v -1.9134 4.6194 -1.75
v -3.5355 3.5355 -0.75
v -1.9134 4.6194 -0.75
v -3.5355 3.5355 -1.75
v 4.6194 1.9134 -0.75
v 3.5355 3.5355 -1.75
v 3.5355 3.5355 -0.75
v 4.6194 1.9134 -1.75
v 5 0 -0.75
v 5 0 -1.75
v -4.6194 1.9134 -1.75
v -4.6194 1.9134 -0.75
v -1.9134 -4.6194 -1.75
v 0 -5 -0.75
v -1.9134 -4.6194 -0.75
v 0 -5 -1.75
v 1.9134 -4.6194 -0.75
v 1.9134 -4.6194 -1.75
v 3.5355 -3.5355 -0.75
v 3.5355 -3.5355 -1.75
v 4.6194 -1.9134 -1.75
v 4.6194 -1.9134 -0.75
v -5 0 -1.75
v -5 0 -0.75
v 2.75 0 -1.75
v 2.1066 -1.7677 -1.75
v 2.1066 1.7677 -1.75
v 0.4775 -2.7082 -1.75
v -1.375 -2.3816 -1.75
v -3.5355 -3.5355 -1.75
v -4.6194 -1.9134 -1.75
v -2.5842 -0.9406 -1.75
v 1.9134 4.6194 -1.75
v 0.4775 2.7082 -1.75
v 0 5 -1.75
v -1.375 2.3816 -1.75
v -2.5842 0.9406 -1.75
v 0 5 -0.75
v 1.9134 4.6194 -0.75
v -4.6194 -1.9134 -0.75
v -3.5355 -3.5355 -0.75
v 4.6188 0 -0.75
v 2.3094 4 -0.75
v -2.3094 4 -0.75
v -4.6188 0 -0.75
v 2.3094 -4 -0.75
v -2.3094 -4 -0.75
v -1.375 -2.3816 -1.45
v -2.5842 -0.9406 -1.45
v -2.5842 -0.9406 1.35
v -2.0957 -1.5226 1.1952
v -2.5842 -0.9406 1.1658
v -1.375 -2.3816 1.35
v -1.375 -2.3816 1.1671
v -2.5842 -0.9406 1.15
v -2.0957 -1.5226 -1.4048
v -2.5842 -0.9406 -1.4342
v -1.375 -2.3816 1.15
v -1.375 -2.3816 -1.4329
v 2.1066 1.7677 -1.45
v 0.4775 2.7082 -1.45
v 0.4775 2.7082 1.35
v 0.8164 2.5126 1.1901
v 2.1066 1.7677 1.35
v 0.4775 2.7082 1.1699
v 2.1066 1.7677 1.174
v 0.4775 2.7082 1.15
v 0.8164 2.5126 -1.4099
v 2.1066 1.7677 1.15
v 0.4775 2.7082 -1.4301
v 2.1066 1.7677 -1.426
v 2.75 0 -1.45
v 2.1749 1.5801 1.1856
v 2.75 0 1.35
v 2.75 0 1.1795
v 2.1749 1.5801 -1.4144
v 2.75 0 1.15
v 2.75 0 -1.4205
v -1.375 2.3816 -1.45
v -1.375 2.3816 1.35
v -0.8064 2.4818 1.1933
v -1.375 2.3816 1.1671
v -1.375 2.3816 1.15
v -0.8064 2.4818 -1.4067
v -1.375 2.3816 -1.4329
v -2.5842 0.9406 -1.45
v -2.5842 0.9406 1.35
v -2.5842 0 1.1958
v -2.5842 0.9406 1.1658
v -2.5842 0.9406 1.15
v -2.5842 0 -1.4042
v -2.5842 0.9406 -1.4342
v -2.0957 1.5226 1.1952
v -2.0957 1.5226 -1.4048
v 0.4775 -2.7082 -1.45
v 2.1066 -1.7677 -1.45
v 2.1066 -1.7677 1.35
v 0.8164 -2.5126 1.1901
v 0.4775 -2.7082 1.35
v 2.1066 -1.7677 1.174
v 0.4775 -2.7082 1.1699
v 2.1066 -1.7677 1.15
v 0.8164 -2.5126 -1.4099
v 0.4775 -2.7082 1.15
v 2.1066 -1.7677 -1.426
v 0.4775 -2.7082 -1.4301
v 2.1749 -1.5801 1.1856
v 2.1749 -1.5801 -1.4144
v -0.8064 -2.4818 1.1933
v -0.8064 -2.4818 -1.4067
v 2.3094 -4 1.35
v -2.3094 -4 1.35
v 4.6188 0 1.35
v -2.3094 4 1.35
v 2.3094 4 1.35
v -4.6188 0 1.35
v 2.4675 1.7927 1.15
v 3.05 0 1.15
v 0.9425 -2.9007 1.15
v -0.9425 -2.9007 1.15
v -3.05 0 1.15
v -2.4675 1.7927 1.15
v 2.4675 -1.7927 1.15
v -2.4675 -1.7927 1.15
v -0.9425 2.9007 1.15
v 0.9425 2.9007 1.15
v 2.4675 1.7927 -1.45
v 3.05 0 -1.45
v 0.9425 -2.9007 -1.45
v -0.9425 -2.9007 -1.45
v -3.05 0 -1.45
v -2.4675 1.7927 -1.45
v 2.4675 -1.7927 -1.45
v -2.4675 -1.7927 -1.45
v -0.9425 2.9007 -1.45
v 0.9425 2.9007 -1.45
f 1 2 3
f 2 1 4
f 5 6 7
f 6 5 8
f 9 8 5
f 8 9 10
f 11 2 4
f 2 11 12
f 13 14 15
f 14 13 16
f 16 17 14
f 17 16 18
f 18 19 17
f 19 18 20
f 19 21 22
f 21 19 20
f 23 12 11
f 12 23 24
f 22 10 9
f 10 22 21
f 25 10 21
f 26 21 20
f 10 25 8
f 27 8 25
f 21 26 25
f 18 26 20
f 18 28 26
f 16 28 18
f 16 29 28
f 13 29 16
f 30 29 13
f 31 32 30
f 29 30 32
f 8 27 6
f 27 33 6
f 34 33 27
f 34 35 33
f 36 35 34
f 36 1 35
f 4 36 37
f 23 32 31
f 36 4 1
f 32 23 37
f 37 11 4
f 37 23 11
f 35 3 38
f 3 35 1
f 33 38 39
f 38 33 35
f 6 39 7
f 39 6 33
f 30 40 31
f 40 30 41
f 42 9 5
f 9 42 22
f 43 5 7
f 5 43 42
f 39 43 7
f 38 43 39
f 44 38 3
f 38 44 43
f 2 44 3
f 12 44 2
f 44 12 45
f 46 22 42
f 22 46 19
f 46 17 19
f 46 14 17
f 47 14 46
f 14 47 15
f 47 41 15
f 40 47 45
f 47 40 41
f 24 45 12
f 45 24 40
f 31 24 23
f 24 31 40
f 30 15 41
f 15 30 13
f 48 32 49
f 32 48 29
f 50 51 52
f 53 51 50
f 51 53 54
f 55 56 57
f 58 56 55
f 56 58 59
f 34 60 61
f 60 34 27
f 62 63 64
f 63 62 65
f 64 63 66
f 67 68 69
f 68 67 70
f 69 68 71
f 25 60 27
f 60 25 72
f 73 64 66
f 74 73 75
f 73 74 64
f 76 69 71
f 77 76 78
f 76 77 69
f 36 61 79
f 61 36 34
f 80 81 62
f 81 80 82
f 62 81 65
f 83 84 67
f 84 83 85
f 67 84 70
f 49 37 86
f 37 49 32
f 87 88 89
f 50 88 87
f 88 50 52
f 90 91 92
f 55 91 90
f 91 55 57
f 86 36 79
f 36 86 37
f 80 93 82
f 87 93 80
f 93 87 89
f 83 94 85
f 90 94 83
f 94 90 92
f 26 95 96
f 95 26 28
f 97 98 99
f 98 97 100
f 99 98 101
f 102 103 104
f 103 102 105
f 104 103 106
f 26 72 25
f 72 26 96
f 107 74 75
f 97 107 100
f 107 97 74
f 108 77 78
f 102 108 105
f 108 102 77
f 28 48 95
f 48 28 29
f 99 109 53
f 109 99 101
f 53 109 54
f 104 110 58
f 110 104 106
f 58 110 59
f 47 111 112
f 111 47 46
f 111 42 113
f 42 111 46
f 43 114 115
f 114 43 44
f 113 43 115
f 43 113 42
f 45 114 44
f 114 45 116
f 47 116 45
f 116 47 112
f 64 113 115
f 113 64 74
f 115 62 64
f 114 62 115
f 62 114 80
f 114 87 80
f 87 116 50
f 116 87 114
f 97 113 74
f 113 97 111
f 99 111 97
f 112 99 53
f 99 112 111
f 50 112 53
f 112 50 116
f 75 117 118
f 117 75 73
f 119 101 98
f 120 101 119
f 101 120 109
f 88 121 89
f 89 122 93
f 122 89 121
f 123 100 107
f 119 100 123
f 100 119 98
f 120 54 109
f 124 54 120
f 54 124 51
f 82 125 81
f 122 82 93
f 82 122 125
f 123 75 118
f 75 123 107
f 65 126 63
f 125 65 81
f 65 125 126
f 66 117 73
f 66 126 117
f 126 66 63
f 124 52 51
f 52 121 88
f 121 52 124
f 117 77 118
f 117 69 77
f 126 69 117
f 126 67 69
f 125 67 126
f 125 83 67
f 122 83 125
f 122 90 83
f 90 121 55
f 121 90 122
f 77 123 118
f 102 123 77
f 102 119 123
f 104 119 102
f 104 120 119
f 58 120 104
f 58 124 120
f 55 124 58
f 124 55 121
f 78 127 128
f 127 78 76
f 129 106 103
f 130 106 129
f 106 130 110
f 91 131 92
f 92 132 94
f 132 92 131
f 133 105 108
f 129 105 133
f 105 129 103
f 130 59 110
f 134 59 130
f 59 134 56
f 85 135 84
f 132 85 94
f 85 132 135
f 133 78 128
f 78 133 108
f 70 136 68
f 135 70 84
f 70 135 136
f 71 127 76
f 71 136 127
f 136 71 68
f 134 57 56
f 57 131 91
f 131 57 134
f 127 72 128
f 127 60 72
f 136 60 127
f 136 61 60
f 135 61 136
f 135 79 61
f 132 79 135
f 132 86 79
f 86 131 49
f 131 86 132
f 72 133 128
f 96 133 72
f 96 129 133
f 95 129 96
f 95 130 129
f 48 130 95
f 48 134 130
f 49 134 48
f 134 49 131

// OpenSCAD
// Parameters
thread_nominal_diameter = 5; //[2.5:10:0.1]
across_flats = 8; //[4:16:0.1]
thickness = 2.7; //[1.35:5.4:0.05]
hole_type = 0; //[0:1:1]
thread_pitch = 0.8; //[0.4:1.6:0.05]
hole_diameter_if_clearance = 5.5; //[5:7:0.05]
chamfer_size = 0.3; //[0:1:0.05]
corner_radius = 0; //[0:1:0.05]
eps = 0.2; //[0.05:0.5:0.05]
washer_outer_diameter = 10; //[6:20:0.1]
washer_thickness = 1; //[0.5:2:0.05]
washer_overlap = 0.6; //[0.2:1.5:0.05]

// Nut and Washer - complete geometry
module nut_and_washer() {
  color("DimGray") {
    difference() {
      union() {
        // Hex Nut Body
        translate([0, 0, 0])
          cylinder(r=across_flats/(2*cos(30)), h=thickness, center=true, $fn=6);
        
        // Washer Ring
        difference() {
          translate([0, 0, -thickness/2 - washer_thickness/2 + washer_overlap])
            cylinder(r=washer_outer_diameter/2, h=washer_thickness, center=true);
          translate([0, 0, -thickness/2 - washer_thickness/2 + washer_overlap])
            cylinder(r=((1-hole_type)*hole_diameter_if_clearance + hole_type*thread_nominal_diameter)/2, h=washer_thickness + 2*eps, center=true);
        }
      }
      
      // Central Hole
      translate([0, 0, 0])
        cylinder(r=((1-hole_type)*hole_diameter_if_clearance + hole_type*thread_nominal_diameter)/2, h=thickness + 2*eps, center=true);
      
      // Edge Chamfer or Lead-in Top
      translate([0, 0, thickness/2 - chamfer_size/2 + eps/2])
        cylinder(r1=((1-hole_type)*hole_diameter_if_clearance + hole_type*thread_nominal_diameter)/2 + chamfer_size, r2=0, h=chamfer_size, center=true);
      
      // Edge Chamfer or Lead-in Bottom
      translate([0, 0, -thickness/2 + chamfer_size/2 - eps/2])
        cylinder(r1=((1-hole_type)*hole_diameter_if_clearance + hole_type*thread_nominal_diameter)/2 + chamfer_size, r2=0, h=chamfer_size, center=true);
    }
  }
}

// Assembly
module assembly() {
  nut_and_washer();
}

assembly();
